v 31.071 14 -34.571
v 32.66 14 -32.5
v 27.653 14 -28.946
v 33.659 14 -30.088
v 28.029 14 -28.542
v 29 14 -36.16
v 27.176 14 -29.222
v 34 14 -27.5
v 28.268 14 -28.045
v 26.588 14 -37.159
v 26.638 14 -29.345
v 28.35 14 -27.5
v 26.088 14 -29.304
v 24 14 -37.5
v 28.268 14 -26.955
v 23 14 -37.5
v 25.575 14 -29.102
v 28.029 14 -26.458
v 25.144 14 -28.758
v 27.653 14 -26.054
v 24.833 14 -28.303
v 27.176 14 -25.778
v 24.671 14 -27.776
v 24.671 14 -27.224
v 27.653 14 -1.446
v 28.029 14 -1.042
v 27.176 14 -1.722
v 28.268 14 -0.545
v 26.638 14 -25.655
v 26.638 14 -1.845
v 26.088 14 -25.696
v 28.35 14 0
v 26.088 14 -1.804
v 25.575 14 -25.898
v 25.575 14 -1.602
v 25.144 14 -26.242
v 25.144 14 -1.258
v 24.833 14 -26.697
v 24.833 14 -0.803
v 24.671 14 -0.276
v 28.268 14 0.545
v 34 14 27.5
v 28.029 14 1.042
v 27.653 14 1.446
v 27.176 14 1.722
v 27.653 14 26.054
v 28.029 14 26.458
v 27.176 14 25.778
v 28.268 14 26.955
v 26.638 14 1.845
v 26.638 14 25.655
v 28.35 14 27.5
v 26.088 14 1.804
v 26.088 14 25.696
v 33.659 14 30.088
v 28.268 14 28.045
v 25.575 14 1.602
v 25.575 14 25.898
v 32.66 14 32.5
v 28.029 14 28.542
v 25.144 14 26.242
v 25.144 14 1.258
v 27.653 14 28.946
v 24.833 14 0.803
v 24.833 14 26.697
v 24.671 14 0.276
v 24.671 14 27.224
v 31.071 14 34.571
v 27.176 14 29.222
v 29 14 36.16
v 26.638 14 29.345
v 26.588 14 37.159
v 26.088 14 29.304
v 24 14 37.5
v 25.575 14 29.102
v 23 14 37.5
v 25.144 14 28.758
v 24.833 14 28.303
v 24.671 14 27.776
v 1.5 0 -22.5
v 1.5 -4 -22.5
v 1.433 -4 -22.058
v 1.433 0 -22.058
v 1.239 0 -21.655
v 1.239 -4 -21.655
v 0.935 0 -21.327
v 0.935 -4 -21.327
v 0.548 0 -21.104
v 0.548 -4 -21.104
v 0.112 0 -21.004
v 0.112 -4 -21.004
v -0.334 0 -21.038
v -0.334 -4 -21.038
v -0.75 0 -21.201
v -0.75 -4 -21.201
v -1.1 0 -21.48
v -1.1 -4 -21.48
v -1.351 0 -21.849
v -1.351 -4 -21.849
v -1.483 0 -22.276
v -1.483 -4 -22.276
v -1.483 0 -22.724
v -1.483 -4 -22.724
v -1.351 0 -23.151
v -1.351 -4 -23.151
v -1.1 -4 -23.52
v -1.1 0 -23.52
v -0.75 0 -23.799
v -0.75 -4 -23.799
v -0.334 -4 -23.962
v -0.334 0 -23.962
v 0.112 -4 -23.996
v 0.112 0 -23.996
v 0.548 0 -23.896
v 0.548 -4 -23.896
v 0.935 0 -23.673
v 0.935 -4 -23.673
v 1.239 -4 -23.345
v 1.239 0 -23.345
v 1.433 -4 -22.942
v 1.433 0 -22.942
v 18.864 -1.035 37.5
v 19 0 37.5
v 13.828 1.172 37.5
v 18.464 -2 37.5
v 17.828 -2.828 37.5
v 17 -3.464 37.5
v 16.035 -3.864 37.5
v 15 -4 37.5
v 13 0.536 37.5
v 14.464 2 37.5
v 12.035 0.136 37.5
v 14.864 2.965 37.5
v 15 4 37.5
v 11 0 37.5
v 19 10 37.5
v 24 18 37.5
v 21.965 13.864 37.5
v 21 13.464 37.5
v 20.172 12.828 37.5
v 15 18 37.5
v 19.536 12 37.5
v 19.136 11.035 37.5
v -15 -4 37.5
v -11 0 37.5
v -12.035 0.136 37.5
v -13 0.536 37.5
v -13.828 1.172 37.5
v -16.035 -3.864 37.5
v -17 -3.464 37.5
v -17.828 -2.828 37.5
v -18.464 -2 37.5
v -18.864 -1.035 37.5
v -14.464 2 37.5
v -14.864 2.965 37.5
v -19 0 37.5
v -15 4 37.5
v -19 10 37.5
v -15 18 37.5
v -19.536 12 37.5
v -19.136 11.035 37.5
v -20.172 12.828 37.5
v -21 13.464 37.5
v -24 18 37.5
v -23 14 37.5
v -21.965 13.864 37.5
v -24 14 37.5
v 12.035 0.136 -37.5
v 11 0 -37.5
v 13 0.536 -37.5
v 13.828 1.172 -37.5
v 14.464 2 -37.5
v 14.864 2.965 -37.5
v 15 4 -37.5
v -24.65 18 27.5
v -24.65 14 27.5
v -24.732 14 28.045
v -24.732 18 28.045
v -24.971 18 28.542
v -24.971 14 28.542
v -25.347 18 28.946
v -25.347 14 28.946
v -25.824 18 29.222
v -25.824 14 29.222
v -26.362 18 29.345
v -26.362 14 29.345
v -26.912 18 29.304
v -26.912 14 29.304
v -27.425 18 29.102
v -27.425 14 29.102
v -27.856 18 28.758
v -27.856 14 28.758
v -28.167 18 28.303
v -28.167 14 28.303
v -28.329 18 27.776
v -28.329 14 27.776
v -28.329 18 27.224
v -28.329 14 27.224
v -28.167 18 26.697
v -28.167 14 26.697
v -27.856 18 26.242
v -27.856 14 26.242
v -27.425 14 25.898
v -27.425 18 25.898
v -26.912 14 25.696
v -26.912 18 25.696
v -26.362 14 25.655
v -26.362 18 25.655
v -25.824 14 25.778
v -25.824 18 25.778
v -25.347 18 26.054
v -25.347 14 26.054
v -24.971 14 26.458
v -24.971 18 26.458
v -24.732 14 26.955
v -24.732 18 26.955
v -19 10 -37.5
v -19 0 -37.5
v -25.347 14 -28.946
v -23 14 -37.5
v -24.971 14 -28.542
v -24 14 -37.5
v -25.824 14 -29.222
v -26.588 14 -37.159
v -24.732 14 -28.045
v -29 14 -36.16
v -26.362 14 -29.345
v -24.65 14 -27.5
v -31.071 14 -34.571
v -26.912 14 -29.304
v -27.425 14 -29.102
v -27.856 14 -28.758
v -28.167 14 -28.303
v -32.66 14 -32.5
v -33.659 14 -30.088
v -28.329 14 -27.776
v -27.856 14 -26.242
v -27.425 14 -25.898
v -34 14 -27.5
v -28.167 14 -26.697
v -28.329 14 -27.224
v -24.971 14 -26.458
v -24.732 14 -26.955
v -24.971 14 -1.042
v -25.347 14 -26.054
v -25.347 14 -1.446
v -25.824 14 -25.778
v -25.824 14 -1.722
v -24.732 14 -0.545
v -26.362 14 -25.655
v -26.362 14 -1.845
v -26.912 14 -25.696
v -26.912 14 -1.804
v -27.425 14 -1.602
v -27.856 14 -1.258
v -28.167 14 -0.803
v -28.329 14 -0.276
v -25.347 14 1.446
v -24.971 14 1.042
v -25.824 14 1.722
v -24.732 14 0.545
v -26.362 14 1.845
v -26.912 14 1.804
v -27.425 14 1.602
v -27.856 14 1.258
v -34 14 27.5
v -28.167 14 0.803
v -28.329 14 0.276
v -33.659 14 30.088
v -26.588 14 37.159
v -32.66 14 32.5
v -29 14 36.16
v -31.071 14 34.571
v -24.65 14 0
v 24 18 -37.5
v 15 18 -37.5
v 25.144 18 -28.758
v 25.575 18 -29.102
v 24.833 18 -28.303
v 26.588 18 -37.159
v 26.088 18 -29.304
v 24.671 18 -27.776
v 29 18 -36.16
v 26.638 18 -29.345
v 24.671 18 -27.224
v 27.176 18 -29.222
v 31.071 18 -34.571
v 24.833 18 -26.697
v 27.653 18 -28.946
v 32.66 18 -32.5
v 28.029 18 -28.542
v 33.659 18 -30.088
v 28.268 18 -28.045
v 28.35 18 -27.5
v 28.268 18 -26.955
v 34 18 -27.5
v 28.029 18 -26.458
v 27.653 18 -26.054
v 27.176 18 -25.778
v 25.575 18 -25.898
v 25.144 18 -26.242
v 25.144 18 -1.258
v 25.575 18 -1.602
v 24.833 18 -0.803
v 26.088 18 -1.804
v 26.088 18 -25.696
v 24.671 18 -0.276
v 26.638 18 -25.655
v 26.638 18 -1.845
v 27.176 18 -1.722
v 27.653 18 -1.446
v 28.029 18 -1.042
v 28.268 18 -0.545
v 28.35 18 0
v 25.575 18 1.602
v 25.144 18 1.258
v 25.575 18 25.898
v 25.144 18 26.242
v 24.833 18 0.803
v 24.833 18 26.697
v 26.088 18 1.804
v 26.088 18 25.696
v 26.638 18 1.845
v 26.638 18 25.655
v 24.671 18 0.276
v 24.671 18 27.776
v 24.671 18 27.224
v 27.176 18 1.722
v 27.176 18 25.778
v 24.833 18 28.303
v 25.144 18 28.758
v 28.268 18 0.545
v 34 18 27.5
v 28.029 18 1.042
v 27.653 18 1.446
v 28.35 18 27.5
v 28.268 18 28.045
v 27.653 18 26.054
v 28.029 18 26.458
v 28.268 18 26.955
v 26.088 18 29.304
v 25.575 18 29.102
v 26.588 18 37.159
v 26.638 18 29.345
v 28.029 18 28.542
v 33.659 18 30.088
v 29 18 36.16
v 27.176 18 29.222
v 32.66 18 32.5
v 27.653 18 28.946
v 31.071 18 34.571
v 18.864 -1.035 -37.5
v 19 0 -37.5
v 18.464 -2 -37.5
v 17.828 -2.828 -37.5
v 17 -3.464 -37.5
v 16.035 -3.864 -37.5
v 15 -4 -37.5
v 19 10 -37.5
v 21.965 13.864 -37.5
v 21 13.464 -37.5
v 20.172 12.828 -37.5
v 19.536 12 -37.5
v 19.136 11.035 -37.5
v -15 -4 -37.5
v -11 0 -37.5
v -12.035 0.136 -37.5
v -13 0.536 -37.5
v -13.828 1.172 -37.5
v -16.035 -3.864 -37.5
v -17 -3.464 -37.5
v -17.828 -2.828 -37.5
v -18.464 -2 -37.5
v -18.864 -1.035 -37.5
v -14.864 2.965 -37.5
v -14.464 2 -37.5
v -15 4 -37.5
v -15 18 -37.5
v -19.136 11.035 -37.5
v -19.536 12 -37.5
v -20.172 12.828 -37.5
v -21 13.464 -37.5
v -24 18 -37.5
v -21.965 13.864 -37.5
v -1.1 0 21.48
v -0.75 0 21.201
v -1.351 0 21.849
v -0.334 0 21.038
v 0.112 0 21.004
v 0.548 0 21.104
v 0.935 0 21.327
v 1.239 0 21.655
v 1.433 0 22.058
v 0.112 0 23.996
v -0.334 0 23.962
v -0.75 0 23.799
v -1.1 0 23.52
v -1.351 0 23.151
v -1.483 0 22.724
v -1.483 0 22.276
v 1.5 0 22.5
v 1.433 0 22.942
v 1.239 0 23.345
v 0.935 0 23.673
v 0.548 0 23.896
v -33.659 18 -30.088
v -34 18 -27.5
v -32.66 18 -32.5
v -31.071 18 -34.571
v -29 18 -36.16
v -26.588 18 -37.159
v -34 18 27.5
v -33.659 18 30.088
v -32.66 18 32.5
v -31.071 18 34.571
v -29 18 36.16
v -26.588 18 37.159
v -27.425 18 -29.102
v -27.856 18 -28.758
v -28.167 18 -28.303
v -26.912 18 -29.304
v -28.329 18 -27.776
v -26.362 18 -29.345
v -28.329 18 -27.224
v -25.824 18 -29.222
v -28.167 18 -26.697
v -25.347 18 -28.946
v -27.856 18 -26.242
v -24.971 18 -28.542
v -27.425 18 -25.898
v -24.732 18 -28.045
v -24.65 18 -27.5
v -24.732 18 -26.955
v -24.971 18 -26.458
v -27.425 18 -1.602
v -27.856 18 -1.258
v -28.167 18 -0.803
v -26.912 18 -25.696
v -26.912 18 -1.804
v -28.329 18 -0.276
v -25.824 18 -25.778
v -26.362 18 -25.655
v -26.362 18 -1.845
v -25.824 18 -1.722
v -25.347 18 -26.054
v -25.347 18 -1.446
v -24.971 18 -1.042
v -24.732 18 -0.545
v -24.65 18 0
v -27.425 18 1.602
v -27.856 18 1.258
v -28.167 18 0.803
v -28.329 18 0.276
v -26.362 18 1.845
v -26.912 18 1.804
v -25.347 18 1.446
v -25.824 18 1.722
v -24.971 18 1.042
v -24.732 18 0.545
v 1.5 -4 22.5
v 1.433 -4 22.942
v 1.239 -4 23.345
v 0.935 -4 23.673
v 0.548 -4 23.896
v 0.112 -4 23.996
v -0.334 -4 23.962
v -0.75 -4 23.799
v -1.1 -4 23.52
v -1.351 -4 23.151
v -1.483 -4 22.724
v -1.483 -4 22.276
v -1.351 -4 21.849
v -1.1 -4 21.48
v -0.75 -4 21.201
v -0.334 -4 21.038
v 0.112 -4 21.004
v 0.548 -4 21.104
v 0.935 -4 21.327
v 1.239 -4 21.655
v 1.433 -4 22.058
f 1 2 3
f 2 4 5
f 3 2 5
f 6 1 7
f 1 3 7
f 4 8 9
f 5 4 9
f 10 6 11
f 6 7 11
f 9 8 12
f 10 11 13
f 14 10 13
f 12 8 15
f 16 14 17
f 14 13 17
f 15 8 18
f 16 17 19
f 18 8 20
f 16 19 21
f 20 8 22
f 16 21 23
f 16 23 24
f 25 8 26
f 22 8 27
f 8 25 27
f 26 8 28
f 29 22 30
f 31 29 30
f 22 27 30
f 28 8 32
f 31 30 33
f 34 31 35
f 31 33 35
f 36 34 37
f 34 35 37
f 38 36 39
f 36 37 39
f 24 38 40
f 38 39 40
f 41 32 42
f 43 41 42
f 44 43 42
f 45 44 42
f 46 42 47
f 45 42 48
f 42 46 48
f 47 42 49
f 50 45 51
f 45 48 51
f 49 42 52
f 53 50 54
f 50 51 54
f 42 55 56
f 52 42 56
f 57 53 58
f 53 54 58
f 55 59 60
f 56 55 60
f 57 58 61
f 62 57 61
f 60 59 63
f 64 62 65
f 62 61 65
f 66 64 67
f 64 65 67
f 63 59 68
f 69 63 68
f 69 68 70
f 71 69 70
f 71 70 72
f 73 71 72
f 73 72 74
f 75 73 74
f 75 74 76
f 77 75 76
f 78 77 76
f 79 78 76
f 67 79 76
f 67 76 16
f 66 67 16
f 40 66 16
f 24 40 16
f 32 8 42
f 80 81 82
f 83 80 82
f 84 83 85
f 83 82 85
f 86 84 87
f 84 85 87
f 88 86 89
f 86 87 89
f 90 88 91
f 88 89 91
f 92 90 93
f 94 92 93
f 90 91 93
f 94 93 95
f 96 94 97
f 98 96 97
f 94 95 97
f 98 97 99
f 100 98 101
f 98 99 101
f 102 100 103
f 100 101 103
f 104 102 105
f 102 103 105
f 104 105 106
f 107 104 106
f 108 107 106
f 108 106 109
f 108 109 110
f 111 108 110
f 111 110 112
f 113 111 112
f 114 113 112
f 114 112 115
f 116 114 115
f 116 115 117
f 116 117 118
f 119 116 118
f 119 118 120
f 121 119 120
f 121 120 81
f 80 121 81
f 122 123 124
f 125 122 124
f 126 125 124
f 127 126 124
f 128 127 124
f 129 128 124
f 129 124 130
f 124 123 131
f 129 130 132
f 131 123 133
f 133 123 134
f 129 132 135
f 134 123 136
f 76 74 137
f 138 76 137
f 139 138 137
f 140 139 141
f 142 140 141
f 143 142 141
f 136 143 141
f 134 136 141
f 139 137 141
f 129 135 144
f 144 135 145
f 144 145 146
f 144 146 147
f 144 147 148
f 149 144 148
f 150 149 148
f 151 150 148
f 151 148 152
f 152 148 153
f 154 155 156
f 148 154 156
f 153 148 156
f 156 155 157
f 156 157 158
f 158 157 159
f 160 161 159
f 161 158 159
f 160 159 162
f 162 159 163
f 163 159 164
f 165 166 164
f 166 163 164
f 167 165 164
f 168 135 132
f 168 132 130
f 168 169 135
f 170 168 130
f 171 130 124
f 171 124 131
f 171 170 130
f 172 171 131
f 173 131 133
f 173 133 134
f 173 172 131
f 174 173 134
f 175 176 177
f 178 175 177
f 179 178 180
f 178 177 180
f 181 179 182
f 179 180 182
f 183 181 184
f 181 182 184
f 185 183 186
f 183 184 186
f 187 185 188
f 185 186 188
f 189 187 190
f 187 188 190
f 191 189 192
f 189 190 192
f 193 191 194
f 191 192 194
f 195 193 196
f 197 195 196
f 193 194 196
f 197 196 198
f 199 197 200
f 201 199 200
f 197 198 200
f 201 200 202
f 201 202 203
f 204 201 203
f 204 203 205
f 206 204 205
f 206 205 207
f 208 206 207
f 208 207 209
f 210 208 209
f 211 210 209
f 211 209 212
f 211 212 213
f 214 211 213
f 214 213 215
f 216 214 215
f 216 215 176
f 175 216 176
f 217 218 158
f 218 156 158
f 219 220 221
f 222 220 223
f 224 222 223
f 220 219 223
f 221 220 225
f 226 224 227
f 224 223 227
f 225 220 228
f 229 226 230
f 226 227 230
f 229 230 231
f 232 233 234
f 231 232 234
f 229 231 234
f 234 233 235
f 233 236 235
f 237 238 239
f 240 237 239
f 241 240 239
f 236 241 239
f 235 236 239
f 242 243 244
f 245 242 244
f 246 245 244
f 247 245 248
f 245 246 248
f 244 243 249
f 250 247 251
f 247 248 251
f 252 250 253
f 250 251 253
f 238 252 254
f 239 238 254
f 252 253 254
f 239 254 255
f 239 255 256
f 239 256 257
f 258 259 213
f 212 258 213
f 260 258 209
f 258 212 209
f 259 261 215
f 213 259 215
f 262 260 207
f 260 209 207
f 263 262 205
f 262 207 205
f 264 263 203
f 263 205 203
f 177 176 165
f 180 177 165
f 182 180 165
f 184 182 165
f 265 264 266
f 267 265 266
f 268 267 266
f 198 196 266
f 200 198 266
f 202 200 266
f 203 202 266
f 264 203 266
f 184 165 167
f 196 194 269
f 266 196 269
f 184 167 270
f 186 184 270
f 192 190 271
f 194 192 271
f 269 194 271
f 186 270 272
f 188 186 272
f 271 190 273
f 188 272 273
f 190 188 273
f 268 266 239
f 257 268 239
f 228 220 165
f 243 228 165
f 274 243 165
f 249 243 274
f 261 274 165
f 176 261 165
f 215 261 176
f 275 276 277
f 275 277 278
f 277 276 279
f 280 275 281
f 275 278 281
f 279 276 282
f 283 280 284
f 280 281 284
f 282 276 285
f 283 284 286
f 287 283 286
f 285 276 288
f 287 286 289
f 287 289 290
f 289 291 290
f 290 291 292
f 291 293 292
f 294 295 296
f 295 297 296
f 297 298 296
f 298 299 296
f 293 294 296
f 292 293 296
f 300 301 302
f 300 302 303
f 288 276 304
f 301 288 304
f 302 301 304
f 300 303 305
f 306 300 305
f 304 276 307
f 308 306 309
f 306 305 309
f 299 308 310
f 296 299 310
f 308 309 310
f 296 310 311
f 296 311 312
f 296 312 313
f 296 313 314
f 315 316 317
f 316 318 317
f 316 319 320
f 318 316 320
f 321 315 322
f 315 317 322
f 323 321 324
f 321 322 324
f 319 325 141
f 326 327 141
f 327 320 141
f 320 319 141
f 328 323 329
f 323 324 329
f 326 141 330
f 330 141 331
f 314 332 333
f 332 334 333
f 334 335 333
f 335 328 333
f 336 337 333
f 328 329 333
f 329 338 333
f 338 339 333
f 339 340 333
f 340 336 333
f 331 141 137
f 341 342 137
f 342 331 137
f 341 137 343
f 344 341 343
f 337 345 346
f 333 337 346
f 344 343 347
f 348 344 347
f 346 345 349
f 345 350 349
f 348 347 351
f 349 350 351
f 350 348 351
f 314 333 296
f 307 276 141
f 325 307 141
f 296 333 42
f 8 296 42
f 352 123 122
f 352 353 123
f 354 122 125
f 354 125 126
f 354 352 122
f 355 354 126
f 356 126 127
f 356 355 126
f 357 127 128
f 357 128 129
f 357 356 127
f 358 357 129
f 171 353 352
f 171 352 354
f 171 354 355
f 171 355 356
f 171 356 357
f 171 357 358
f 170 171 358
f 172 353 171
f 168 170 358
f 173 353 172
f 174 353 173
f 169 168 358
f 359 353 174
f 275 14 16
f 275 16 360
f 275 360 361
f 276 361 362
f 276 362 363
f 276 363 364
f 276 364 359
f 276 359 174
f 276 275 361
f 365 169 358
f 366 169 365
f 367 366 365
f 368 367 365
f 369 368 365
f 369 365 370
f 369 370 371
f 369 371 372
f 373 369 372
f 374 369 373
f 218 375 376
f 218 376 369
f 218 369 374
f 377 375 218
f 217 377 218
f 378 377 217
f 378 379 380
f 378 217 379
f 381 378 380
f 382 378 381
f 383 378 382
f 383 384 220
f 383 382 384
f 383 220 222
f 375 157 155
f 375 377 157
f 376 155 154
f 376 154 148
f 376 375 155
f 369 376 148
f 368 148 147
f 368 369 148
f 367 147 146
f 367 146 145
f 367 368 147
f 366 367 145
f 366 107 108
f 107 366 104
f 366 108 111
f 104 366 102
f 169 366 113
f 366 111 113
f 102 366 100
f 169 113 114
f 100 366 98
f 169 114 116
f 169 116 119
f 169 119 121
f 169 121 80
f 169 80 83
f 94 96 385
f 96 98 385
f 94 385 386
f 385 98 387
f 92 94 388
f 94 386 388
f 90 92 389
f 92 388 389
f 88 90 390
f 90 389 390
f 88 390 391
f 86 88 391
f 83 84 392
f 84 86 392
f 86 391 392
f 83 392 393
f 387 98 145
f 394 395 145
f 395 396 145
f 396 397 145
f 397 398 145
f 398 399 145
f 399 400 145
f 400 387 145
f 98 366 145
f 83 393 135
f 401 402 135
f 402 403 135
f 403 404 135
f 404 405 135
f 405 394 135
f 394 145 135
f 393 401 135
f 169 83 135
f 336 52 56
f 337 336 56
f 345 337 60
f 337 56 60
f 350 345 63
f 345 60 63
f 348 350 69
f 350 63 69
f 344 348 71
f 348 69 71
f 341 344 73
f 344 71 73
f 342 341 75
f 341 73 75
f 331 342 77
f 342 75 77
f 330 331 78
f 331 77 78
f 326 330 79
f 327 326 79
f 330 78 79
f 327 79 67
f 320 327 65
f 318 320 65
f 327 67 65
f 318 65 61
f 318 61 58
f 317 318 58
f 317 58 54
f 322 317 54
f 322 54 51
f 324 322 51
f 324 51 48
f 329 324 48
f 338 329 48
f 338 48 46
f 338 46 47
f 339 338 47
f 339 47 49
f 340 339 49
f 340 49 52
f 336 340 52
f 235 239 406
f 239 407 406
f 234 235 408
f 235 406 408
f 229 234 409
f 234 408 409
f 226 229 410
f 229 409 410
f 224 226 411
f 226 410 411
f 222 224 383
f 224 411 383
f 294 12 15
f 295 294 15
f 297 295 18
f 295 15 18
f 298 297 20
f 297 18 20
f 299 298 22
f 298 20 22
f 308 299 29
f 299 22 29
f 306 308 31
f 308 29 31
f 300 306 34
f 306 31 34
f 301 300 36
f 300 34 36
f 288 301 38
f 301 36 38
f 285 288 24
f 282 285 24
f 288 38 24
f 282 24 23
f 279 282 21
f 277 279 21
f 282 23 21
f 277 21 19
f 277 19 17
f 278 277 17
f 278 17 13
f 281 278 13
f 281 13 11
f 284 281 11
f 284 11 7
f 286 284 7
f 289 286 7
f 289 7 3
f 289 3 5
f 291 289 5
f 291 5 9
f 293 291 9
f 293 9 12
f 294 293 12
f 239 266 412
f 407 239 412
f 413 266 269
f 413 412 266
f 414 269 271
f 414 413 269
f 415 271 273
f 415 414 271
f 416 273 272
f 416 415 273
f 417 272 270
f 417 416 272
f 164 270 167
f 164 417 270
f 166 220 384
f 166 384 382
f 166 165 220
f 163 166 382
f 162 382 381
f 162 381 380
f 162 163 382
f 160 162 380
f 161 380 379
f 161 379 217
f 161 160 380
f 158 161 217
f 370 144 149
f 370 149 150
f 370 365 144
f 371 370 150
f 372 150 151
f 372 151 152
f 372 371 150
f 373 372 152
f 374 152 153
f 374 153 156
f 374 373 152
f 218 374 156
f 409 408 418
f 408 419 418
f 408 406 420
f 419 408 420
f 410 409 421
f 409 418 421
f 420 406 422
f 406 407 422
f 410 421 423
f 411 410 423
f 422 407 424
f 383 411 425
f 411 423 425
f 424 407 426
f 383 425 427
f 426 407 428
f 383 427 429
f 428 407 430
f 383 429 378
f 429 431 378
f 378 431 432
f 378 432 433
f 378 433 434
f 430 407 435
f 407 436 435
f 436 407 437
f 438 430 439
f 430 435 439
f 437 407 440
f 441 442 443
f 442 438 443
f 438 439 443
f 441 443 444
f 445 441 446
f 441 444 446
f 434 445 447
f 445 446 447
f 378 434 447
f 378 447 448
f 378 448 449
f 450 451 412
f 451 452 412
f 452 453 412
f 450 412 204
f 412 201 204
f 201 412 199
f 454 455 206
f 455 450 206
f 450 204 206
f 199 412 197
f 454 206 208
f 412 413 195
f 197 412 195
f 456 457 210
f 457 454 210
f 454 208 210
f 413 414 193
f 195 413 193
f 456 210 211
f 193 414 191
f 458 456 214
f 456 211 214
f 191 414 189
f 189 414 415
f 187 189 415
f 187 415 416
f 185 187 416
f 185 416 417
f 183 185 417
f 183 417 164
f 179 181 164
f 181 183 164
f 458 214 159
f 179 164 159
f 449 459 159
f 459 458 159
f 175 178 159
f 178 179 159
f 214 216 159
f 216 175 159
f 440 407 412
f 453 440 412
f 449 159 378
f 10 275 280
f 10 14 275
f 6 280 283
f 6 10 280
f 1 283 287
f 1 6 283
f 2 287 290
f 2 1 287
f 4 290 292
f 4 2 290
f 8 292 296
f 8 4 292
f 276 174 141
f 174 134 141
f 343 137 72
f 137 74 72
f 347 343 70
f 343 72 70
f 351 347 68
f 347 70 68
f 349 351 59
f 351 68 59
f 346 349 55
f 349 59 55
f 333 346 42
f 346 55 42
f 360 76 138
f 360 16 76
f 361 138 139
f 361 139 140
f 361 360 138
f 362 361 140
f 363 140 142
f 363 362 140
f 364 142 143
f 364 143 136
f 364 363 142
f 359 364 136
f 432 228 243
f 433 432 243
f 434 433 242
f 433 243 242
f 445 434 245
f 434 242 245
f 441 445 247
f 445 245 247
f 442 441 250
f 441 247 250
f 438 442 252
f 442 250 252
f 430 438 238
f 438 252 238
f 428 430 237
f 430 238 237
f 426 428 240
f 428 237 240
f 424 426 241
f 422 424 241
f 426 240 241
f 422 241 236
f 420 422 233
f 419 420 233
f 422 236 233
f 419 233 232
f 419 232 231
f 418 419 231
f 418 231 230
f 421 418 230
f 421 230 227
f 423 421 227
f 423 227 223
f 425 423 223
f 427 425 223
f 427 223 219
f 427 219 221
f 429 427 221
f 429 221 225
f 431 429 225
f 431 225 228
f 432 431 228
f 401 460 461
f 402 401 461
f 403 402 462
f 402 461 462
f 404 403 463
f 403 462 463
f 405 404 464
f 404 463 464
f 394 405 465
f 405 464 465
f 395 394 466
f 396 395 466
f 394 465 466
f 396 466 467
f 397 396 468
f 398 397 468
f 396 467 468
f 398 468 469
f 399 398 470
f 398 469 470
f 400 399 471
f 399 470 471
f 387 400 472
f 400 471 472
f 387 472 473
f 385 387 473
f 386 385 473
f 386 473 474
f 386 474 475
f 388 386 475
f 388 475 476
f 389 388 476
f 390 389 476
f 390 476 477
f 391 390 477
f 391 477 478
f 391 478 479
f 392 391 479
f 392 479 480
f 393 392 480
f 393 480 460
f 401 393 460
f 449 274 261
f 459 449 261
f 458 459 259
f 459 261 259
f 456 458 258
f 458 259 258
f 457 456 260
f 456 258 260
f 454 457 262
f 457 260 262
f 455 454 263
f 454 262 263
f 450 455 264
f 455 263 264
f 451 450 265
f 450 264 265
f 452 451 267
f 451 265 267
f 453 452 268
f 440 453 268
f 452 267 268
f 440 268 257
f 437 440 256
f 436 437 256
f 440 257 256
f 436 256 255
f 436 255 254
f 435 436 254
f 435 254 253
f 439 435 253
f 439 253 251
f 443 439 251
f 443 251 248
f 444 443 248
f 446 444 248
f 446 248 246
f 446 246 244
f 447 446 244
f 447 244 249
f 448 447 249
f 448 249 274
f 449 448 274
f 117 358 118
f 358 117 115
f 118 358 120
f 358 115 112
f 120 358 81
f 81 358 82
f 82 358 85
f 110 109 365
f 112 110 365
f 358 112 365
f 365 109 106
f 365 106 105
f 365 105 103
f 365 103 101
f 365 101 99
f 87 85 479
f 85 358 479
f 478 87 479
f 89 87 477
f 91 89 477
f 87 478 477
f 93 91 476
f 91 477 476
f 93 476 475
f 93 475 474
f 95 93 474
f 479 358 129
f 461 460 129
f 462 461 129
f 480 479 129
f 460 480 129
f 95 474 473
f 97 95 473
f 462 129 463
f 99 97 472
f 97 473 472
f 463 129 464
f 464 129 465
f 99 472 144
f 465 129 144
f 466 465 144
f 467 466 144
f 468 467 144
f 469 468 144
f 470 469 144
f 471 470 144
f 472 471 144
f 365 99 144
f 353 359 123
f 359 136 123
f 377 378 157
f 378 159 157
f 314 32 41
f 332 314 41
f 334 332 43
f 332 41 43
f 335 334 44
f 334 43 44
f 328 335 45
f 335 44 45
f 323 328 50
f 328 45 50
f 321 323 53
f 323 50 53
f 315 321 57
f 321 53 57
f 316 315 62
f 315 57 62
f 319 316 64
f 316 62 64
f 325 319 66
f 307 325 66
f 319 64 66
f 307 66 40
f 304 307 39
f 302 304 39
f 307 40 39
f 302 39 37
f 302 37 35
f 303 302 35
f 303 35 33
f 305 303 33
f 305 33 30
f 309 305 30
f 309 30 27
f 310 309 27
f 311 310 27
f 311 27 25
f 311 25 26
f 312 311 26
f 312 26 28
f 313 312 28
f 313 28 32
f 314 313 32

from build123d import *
from OCP.BRepFilletAPI import BRepFilletAPI_MakeFillet

# Parameters (mm, degrees)
BOSS_EXTRUDE1_DEPTH = 37.5
SKETCH2_R           = 1.5
SKETCH2_R_2         = 1.85
CUT_EXTRUDE1_DEPTH  = 56.192843739
FILLET1_R1          = 4
FILLET1_R2          = 10


with BuildPart() as part:
    # Sketch1 → Boss-Extrude1 (new, symmetric)
    with BuildSketch(Plane.XY):
        Polygon((-34, 18), (-15, 18), (-15, 0), (15, 0), (15, 18), (34, 18), (34, 14), (19, 14), (19, -4), (-19, -4), (-19, 14), (-34, 14), align=None)
    extrude(amount=BOSS_EXTRUDE1_DEPTH, both=True)

    # Sketch2 → Cut-Extrude1 (cut, through all)
    with BuildSketch(Plane.XZ.offset(4)):
        with Locations((0, 22.5)):
            Circle(SKETCH2_R)
        with Locations((0, -22.5)):
            Circle(SKETCH2_R)
        with Locations((-26.5, 27.5)):
            Circle(SKETCH2_R_2)
        with Locations((-26.5, 0)):
            Circle(SKETCH2_R_2)
        with Locations((-26.5, -27.5)):
            Circle(SKETCH2_R_2)
        with Locations((26.5, 27.5)):
            Circle(SKETCH2_R_2)
        with Locations((26.5, -27.5)):
            Circle(SKETCH2_R_2)
        with Locations((26.5, 0)):
            Circle(SKETCH2_R_2)
    extrude(amount=-CUT_EXTRUDE1_DEPTH, mode=Mode.SUBTRACT)

    # Fillet1: one fillet with a radius per group of edges: ONE call of the kernel's fillet builder (fillet() takes one radius for all edges)
    fillet1_edges_1 = [part.edges().sort_by_distance(p)[0] for p in [
        (-15, 0, 0),
        (15, 0, 0),
        (-19, -4, 0),
        (19, -4, 0),
        (19, 14, 0),
        (-19, 14, 0),
    ]]
    fillet1_edges_2 = [part.edges().sort_by_distance(p)[0] for p in [
        (-34, 16, 37.5),
        (-34, 16, -37.5),
        (34, 16, -37.5),
        (34, 16, 37.5),
    ]]
    fillet1 = BRepFilletAPI_MakeFillet(part.part.solid().wrapped)
    for e in fillet1_edges_1:
        fillet1.Add(FILLET1_R1, e.wrapped)
    for e in fillet1_edges_2:
        fillet1.Add(FILLET1_R2, e.wrapped)
    add(Compound.cast(fillet1.Shape()), mode=Mode.REPLACE)


solid = part.part
